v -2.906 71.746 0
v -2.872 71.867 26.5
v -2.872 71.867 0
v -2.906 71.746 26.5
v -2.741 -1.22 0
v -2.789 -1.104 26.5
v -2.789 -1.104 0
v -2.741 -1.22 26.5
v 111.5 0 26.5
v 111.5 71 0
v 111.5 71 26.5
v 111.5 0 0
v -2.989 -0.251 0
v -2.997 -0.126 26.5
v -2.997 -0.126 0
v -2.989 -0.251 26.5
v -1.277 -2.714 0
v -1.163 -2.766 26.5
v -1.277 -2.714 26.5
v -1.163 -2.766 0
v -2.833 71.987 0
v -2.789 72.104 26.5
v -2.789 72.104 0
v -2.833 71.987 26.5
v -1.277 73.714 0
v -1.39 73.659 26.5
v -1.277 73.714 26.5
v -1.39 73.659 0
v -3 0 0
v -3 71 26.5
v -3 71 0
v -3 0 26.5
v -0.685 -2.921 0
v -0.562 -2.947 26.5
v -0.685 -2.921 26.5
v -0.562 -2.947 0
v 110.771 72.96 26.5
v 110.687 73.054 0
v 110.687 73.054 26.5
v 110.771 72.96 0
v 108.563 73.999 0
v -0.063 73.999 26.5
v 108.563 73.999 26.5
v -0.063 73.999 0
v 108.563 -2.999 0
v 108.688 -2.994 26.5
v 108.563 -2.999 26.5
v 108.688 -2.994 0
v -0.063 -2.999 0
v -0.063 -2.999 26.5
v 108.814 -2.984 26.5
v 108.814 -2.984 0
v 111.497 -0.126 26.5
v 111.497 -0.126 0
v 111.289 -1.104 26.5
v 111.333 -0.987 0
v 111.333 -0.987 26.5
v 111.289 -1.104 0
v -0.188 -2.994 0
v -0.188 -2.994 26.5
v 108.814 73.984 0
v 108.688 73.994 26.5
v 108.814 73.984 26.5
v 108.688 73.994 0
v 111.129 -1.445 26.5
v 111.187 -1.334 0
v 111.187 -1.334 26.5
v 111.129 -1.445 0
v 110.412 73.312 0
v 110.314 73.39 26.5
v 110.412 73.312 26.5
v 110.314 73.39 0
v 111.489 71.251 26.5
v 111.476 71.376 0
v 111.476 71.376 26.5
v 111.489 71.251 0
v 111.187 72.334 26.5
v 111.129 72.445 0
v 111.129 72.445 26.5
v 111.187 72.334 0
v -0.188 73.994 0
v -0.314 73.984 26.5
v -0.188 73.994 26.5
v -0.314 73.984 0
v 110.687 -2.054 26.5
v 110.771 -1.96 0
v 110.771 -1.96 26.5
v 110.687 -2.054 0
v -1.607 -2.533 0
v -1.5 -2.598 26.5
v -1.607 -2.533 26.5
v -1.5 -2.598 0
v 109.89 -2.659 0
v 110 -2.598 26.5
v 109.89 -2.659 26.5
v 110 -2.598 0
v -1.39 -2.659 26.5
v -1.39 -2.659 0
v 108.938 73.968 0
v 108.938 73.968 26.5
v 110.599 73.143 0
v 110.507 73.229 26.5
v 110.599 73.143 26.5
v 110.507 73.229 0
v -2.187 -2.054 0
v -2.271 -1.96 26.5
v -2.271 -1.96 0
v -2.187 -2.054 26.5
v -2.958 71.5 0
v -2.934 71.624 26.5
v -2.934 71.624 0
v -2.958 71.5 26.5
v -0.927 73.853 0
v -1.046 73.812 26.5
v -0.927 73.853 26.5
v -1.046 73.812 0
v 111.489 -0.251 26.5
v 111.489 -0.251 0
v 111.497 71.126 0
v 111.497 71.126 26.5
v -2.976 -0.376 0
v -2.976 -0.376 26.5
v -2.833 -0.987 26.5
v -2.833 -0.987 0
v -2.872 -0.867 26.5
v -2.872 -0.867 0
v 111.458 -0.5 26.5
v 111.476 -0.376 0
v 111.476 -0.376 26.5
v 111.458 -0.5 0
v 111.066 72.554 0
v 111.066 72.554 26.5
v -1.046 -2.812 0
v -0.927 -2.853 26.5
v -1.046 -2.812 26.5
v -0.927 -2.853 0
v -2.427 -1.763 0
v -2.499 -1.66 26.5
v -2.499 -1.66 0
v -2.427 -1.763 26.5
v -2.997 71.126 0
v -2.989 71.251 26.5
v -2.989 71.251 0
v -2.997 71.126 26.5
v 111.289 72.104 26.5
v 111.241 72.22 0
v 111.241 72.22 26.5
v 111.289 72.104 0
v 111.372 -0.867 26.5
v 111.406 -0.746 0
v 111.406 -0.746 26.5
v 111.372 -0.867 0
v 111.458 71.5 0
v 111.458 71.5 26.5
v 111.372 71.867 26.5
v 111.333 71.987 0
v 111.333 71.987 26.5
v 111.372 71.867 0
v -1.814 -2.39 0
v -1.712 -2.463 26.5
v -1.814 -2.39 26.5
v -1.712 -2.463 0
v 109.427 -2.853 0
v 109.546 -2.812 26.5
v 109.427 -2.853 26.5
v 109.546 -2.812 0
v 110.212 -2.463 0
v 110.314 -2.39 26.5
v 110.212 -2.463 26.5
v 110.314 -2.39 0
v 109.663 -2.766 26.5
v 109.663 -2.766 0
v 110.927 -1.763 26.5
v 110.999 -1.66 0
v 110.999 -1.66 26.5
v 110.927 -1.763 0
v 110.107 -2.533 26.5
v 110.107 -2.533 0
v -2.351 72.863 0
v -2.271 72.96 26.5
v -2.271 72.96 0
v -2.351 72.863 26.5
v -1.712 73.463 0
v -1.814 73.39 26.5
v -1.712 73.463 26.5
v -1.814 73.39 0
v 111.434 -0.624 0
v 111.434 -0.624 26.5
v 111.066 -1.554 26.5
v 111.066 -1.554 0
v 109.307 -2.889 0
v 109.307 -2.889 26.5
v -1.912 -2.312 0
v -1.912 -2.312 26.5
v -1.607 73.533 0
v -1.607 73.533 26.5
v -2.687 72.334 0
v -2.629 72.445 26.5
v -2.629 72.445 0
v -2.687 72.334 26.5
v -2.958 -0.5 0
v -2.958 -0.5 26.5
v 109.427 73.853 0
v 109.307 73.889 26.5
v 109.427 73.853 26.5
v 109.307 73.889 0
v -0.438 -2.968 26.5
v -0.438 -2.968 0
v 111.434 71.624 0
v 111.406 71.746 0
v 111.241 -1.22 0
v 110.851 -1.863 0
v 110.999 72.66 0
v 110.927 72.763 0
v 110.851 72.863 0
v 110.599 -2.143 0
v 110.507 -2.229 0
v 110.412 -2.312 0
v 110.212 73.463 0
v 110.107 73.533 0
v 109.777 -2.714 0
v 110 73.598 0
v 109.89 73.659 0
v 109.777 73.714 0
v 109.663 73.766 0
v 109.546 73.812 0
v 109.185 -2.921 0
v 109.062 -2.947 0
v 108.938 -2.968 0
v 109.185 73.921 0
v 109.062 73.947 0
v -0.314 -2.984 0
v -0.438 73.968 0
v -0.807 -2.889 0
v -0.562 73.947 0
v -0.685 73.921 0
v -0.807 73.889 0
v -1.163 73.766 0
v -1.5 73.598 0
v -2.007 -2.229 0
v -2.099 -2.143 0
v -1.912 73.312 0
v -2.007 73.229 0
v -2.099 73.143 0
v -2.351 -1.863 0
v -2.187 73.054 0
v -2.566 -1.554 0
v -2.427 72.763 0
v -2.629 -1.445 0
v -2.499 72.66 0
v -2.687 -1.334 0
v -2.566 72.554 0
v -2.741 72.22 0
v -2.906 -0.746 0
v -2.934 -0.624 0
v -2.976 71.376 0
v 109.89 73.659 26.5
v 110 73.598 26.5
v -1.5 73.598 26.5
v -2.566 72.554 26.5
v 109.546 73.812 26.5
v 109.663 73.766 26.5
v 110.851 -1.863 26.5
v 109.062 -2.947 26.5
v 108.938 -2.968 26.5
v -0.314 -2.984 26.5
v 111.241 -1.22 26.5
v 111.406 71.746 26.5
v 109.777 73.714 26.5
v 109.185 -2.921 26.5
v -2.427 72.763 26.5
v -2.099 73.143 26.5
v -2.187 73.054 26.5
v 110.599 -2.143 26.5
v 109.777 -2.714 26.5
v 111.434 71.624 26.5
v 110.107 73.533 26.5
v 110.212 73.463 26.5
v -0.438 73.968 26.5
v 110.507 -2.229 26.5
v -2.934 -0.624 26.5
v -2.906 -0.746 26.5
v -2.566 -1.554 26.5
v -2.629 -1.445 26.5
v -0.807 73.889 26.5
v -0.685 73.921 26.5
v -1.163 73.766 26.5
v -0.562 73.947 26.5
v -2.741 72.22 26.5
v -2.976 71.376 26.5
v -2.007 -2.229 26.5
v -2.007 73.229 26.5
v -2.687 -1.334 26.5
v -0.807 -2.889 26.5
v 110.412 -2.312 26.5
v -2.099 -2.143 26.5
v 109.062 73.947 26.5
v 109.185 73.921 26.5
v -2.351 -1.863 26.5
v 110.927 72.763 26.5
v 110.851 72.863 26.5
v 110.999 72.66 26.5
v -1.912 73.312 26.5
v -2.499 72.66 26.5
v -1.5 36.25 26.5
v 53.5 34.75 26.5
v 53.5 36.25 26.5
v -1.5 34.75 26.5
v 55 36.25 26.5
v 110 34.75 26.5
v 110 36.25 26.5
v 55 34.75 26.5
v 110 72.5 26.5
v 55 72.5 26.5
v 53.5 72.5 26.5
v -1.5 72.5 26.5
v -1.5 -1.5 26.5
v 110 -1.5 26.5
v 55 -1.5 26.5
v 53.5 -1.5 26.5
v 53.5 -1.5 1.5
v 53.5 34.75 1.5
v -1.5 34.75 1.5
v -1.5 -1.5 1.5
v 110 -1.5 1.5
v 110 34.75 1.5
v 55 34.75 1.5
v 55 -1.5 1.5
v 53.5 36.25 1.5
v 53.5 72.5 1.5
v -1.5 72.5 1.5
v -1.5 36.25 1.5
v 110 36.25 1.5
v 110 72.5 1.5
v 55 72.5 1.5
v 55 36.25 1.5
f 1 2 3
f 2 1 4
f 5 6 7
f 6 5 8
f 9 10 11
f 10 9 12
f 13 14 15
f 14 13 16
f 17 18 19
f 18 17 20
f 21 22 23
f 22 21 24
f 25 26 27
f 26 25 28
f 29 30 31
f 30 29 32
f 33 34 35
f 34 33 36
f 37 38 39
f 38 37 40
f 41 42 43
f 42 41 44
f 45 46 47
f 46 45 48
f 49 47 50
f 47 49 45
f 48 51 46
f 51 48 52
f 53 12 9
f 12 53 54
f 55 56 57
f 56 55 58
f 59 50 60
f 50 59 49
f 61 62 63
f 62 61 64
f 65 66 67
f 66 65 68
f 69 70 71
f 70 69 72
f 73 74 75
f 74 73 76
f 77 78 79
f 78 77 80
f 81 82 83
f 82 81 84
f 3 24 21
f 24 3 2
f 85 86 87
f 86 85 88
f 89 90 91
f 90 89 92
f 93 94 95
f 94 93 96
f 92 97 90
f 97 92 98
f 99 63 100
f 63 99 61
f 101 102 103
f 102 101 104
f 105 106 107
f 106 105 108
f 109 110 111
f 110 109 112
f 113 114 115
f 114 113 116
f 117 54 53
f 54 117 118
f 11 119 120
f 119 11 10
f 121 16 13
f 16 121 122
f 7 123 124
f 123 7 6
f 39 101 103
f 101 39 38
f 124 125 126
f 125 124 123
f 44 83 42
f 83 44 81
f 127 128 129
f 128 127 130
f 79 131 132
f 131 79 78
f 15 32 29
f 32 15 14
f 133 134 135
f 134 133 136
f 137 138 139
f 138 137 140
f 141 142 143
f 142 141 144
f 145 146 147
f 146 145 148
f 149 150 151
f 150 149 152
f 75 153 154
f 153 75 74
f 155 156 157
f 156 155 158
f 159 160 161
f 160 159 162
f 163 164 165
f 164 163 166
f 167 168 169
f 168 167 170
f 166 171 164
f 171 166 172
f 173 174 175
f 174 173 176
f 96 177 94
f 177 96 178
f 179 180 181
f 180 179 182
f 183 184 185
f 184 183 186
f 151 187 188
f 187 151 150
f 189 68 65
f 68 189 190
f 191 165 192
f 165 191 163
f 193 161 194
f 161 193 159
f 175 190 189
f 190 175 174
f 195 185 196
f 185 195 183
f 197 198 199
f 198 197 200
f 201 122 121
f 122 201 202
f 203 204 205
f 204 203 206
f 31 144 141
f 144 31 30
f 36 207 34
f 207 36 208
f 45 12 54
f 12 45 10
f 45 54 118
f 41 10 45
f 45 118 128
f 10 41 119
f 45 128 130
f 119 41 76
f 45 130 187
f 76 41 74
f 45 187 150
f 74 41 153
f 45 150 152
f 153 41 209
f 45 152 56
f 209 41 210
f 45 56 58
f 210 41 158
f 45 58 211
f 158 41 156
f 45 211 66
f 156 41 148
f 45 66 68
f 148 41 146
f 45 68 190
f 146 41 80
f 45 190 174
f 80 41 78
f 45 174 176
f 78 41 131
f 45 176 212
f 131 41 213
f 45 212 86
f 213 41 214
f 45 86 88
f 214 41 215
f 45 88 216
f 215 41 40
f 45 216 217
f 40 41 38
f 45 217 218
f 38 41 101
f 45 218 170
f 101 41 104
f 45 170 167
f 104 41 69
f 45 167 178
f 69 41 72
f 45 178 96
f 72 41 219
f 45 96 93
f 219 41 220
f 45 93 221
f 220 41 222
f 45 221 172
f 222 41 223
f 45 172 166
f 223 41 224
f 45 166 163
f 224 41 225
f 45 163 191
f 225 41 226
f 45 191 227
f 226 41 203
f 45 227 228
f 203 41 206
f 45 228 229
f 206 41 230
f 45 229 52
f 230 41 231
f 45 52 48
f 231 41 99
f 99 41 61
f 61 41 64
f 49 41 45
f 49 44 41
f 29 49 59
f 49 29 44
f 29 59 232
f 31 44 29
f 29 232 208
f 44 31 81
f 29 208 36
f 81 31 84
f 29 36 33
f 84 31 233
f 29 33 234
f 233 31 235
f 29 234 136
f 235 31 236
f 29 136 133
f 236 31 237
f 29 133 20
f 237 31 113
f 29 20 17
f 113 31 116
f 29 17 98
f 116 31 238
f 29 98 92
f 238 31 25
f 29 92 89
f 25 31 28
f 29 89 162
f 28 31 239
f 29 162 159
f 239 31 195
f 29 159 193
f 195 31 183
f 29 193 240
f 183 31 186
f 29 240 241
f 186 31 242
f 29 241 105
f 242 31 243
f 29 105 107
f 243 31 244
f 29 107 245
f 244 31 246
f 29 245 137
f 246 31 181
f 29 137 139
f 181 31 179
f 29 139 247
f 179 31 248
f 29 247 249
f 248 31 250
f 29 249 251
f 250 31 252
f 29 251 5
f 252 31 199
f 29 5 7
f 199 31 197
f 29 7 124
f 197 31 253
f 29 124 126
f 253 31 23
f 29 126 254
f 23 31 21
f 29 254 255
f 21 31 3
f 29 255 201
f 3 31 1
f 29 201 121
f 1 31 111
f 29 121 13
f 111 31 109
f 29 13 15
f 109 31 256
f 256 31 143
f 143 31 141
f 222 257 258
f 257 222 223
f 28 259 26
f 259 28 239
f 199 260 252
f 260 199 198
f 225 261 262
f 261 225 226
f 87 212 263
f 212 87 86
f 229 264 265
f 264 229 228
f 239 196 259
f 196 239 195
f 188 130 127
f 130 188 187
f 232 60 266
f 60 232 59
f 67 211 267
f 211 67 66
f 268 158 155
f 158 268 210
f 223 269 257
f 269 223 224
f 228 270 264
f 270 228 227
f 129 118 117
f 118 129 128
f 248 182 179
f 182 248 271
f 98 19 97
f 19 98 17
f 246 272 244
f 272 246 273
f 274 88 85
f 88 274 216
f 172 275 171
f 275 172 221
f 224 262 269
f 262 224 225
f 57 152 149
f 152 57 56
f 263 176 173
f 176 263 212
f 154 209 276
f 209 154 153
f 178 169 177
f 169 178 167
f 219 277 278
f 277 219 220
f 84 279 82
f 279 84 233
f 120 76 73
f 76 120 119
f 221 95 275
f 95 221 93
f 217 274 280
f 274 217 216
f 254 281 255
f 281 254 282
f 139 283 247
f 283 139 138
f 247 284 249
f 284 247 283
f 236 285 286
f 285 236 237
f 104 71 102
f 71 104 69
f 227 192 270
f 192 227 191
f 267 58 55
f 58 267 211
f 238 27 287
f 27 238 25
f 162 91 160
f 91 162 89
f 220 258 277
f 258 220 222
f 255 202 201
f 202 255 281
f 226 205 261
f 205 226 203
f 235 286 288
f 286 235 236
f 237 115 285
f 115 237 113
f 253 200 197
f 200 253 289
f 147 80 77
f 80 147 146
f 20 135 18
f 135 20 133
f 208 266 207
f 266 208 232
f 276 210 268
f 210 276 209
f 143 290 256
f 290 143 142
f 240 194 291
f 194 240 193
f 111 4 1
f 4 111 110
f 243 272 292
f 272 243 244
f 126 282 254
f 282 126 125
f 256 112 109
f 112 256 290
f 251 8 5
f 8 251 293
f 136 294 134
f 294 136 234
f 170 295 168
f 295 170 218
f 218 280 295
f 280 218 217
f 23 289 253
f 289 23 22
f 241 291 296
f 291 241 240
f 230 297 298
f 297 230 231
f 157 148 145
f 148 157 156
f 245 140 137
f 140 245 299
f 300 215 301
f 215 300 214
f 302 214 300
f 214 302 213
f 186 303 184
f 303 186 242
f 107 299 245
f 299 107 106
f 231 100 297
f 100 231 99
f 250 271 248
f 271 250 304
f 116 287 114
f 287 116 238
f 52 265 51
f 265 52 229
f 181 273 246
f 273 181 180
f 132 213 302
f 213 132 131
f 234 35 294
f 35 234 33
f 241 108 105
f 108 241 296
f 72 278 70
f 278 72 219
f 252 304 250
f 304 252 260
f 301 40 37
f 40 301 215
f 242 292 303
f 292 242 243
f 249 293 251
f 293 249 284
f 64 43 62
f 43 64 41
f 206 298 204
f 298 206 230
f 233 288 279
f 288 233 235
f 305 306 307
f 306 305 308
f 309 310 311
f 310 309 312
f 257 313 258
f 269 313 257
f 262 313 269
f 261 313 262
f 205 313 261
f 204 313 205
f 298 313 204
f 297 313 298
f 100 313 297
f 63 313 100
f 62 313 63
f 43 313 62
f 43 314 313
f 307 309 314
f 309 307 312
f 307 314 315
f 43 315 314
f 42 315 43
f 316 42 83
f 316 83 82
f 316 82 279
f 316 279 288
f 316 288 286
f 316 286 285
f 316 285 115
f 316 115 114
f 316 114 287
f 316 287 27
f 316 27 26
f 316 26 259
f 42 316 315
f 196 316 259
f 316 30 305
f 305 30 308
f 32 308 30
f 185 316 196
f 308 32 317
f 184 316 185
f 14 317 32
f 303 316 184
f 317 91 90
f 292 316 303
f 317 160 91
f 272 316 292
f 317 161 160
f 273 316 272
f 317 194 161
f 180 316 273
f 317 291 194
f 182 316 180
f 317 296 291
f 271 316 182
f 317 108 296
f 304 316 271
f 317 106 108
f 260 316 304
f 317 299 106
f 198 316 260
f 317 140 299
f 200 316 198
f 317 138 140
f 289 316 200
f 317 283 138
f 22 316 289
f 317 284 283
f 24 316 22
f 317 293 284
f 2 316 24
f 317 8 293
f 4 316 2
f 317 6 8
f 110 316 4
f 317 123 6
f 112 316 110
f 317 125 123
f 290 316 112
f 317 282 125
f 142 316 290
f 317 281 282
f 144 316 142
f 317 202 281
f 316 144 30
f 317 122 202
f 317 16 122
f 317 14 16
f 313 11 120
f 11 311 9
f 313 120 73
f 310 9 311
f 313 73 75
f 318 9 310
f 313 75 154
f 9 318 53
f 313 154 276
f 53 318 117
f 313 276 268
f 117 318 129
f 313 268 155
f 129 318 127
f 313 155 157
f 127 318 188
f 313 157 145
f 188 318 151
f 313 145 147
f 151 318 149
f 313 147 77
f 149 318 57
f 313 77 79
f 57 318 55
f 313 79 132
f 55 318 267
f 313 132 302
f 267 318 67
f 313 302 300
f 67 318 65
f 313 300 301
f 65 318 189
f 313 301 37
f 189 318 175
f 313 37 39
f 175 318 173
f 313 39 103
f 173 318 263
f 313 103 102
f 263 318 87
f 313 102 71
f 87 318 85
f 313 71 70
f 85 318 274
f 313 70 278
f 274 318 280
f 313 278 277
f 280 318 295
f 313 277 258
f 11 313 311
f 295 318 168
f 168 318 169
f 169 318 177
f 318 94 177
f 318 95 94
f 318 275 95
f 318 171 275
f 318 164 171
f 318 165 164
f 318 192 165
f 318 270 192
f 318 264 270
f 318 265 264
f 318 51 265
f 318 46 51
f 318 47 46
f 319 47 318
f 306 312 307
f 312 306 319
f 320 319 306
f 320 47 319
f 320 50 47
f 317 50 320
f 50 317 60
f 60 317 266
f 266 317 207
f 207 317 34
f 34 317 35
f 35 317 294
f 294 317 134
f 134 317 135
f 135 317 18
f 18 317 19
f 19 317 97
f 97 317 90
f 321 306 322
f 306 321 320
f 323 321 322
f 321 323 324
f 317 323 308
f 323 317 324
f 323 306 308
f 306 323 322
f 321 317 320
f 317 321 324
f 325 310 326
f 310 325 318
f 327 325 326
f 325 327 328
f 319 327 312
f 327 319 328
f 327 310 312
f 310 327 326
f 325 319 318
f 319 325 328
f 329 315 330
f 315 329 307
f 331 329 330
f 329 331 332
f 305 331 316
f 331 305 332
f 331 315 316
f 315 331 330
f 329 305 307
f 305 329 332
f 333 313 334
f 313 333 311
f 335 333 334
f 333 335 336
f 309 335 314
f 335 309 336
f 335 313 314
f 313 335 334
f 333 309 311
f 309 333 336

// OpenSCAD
$fn = 150;

difference() {
	minkowski() {
		cylinder(h = 1e-05, r = 3);
		cube(size = [108.5, 71.0, 26.5]);
	}
	translate(v = [-1.5, -1.5, 1.5]) {
		cube(size = [55.0, 36.25, 28.0]);
	}
	translate(v = [55.0, -1.5, 1.5]) {
		cube(size = [55.0, 36.25, 28.0]);
	}
	translate(v = [-1.5, 36.25, 1.5]) {
		cube(size = [55.0, 36.25, 28.0]);
	}
	translate(v = [55.0, 36.25, 1.5]) {
		cube(size = [55.0, 36.25, 28.0]);
	}
}
